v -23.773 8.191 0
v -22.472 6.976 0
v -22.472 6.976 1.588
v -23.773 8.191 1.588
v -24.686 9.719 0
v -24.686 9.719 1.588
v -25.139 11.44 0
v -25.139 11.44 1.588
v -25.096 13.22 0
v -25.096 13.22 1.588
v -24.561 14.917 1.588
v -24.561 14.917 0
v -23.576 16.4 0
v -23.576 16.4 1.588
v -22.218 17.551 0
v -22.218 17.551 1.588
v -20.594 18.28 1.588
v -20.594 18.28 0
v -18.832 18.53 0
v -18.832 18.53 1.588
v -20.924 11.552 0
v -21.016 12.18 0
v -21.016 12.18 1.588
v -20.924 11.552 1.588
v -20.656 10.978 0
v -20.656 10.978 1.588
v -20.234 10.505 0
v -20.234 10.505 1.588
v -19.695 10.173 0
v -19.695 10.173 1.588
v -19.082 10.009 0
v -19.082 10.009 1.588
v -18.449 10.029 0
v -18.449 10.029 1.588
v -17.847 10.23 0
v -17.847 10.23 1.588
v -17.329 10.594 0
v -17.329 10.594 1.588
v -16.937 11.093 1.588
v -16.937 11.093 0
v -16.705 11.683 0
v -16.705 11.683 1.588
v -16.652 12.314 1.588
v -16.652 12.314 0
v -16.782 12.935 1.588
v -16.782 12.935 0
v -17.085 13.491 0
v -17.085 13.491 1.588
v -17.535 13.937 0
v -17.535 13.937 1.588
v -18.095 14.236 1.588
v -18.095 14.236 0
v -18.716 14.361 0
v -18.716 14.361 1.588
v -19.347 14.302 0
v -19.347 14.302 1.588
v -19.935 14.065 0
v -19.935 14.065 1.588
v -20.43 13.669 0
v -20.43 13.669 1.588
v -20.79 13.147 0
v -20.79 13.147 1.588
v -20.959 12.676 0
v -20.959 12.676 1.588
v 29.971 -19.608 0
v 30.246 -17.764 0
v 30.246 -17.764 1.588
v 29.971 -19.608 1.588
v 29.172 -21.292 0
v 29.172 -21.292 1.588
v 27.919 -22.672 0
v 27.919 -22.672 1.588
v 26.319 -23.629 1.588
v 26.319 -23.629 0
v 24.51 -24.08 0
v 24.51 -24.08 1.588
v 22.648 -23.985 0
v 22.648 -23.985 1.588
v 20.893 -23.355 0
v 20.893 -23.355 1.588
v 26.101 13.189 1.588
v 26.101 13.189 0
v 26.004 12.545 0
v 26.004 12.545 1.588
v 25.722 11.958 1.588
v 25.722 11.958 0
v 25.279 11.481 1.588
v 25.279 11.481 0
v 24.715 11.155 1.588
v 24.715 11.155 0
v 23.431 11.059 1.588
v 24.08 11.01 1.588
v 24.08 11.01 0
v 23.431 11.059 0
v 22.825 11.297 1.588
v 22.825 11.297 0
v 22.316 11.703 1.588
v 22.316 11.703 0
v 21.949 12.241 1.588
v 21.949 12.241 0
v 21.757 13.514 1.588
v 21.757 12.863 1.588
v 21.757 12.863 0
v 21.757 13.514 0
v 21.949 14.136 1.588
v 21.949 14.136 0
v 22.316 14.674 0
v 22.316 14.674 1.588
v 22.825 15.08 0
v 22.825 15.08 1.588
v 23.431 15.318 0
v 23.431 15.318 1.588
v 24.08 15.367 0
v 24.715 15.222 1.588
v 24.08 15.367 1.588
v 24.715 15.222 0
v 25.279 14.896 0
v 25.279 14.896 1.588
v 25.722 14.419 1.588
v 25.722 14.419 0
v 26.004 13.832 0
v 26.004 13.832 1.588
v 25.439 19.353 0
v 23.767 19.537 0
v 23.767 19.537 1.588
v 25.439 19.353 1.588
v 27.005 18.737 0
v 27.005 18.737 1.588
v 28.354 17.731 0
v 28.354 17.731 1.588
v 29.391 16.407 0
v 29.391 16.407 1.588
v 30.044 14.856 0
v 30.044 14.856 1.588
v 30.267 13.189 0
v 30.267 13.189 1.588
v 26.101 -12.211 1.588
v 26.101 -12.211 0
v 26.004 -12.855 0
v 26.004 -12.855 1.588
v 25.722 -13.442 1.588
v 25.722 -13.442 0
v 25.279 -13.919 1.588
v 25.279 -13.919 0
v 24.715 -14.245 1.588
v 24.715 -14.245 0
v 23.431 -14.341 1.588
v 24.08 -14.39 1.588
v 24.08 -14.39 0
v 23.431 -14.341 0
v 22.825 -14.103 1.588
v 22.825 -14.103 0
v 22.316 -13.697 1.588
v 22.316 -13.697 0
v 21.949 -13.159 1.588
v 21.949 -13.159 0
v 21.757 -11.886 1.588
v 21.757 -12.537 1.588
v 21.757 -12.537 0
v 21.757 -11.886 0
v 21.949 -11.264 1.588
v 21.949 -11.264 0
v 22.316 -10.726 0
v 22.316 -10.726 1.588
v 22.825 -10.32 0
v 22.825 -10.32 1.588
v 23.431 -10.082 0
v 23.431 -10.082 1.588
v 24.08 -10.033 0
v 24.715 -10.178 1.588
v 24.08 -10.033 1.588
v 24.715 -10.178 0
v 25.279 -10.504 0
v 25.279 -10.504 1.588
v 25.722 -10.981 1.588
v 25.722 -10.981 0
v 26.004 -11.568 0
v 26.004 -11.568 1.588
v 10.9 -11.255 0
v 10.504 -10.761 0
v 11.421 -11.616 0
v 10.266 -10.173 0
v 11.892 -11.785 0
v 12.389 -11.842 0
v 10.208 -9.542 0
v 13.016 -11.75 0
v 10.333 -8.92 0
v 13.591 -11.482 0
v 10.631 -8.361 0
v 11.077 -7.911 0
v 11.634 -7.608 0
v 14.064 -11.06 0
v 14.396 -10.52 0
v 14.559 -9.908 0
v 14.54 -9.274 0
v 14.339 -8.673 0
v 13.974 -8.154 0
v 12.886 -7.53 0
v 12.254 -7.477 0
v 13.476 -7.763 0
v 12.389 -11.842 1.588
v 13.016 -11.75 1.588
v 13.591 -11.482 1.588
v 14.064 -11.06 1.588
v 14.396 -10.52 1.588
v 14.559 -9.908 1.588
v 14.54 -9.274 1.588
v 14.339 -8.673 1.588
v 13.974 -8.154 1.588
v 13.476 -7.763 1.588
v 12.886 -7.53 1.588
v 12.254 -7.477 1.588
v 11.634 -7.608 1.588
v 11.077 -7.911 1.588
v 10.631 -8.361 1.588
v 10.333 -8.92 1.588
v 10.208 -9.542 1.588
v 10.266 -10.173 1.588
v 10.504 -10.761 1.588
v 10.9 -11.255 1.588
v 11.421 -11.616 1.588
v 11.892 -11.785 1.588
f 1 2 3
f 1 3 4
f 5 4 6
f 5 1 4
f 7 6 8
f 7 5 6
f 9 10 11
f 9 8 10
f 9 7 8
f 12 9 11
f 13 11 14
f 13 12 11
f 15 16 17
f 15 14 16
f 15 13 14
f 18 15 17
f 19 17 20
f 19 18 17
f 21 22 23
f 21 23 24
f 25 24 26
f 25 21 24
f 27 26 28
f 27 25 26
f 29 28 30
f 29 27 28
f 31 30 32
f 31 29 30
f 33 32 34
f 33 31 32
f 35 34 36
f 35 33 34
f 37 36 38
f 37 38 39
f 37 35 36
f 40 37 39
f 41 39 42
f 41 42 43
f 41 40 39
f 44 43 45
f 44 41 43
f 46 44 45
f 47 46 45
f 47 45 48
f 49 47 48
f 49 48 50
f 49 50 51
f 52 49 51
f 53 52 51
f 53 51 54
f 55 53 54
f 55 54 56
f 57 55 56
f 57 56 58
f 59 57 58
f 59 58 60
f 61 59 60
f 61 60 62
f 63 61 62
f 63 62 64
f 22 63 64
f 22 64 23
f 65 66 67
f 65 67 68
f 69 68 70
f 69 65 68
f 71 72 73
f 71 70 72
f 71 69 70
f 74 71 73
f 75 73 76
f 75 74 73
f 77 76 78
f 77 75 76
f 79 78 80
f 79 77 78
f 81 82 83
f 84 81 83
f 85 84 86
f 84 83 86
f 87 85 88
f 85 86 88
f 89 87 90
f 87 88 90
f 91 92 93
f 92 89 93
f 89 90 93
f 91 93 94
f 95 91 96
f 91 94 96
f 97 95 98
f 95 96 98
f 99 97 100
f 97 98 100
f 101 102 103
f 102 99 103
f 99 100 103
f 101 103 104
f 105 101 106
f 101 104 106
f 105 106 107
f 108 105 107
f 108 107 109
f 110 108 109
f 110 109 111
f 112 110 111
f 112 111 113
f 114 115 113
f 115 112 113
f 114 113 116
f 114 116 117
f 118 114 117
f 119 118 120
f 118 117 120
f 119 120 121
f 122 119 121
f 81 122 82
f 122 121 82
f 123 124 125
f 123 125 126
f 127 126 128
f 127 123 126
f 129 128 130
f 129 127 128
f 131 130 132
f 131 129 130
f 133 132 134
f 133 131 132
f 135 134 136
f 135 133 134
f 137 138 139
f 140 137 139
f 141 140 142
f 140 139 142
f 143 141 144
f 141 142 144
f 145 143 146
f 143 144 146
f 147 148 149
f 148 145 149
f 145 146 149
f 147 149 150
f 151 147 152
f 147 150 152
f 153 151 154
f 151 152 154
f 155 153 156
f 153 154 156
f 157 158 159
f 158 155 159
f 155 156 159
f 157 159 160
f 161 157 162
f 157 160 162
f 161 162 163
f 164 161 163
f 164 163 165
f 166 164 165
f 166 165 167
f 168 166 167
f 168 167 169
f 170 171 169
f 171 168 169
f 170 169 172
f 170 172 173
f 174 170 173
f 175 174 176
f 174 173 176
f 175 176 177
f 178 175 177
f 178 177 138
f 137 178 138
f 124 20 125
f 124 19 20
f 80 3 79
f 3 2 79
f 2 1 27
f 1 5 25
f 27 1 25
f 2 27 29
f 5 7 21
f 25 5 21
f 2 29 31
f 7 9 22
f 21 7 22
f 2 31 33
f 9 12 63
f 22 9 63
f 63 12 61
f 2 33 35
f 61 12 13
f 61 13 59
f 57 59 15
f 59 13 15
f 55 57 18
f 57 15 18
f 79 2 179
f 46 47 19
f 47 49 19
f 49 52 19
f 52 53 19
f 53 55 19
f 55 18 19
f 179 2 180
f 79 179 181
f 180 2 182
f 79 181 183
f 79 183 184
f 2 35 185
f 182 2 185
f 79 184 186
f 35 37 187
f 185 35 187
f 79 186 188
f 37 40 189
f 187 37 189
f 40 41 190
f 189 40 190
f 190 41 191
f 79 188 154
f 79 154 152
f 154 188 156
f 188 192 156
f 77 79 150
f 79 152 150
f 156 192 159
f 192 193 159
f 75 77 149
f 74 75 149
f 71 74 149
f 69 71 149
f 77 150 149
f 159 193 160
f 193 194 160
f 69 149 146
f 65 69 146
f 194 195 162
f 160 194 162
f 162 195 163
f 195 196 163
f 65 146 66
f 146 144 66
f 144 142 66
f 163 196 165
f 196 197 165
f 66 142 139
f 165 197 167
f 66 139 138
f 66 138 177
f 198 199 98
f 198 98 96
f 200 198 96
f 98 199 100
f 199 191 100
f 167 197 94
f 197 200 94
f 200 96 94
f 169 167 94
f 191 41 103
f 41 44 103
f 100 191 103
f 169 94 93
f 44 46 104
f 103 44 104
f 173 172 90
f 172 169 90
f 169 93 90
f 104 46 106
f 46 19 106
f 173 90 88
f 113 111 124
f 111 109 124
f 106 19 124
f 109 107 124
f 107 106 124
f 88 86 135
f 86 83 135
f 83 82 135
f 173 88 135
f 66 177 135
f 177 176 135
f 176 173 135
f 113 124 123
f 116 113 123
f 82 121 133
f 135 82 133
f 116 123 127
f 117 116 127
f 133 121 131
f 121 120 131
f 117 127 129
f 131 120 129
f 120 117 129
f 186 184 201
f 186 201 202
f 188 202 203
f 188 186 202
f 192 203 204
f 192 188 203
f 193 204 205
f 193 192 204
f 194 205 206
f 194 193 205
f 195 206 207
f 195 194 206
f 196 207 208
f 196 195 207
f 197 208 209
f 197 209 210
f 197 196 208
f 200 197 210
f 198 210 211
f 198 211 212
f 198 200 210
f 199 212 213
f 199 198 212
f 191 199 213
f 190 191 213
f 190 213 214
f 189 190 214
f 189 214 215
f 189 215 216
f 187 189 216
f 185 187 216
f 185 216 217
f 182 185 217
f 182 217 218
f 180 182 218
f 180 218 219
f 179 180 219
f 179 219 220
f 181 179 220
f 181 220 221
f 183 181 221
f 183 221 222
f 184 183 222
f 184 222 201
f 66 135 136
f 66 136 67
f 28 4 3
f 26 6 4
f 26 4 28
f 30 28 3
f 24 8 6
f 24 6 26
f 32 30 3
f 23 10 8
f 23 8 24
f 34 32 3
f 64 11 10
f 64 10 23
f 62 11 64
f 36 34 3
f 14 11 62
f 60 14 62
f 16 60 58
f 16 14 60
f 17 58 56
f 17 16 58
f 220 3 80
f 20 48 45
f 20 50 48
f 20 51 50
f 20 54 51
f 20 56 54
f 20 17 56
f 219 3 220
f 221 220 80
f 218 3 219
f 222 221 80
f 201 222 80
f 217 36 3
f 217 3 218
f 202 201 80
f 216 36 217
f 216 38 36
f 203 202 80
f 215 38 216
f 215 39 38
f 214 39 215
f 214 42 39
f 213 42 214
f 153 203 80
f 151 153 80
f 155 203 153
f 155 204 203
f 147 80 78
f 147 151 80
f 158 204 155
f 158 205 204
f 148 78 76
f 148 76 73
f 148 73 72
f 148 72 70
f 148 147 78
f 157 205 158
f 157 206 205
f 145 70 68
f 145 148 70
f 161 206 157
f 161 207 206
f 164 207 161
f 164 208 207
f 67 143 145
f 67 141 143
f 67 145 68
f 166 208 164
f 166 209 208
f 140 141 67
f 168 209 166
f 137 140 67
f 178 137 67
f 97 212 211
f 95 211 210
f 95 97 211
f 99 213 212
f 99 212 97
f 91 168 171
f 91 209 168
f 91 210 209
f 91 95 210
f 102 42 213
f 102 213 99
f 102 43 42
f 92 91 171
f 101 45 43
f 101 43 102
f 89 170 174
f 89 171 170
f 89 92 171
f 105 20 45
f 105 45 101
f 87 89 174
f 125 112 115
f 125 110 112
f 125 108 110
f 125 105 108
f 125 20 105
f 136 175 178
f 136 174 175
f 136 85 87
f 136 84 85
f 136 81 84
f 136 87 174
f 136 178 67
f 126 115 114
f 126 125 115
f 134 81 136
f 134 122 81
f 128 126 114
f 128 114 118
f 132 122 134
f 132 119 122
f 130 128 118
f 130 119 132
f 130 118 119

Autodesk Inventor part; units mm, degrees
ref_plane "YZ Plane" through (0, 0, 0) normal (1, 0, 0) x (0, 1, 0)
ref_plane "XZ Plane" through (0, 0, 0) normal (0, 1, 0) x (-1, 0, 0)
ref_plane "XY Plane" through (0, 0, 0) normal (0, 0, 1) x (1, 0, 0)
sketch "Sketch1" plane through (0, 0, 0) normal (0, 0, 1) x (1, 0, 0)
  circle A0 centre (23.9168, 13.1886) radius 2.1844
  ellipse E0 centre (12.3891, -9.6575) end of major axis (10.2047, -9.6575) minor radius 2.1844
  ellipse E1 centre (-18.832, 12.1795) end of major axis (-21.0164, 12.1795) minor radius 2.1844
  line L0 (-18.832, 18.5295) -> (23.7667, 19.5368)
  arc A1 (-18.832, 18.5295) -> (-22.4715, 6.9759) centre (-18.832, 12.1795) ccw
  arc A2 (30.2668, 13.1886) -> (23.7667, 19.5368) centre (23.9168, 13.1886) ccw
  line L1 (-22.4715, 6.9759) -> (20.8933, -23.3546)
  line L2 (30.2668, 13.1886) -> (30.2458, -17.7636)
  arc A3 (20.8933, -23.3546) -> (30.2458, -17.7636) centre (23.8958, -17.7593) ccw
  circle A4 centre (23.9168, -12.2114) radius 2.1844
  point P0 (0, 0)
  dimension "d6" = 4.3688
extrude "Extrusion2" add sketch "Sketch1" along normal blind 1.5875
